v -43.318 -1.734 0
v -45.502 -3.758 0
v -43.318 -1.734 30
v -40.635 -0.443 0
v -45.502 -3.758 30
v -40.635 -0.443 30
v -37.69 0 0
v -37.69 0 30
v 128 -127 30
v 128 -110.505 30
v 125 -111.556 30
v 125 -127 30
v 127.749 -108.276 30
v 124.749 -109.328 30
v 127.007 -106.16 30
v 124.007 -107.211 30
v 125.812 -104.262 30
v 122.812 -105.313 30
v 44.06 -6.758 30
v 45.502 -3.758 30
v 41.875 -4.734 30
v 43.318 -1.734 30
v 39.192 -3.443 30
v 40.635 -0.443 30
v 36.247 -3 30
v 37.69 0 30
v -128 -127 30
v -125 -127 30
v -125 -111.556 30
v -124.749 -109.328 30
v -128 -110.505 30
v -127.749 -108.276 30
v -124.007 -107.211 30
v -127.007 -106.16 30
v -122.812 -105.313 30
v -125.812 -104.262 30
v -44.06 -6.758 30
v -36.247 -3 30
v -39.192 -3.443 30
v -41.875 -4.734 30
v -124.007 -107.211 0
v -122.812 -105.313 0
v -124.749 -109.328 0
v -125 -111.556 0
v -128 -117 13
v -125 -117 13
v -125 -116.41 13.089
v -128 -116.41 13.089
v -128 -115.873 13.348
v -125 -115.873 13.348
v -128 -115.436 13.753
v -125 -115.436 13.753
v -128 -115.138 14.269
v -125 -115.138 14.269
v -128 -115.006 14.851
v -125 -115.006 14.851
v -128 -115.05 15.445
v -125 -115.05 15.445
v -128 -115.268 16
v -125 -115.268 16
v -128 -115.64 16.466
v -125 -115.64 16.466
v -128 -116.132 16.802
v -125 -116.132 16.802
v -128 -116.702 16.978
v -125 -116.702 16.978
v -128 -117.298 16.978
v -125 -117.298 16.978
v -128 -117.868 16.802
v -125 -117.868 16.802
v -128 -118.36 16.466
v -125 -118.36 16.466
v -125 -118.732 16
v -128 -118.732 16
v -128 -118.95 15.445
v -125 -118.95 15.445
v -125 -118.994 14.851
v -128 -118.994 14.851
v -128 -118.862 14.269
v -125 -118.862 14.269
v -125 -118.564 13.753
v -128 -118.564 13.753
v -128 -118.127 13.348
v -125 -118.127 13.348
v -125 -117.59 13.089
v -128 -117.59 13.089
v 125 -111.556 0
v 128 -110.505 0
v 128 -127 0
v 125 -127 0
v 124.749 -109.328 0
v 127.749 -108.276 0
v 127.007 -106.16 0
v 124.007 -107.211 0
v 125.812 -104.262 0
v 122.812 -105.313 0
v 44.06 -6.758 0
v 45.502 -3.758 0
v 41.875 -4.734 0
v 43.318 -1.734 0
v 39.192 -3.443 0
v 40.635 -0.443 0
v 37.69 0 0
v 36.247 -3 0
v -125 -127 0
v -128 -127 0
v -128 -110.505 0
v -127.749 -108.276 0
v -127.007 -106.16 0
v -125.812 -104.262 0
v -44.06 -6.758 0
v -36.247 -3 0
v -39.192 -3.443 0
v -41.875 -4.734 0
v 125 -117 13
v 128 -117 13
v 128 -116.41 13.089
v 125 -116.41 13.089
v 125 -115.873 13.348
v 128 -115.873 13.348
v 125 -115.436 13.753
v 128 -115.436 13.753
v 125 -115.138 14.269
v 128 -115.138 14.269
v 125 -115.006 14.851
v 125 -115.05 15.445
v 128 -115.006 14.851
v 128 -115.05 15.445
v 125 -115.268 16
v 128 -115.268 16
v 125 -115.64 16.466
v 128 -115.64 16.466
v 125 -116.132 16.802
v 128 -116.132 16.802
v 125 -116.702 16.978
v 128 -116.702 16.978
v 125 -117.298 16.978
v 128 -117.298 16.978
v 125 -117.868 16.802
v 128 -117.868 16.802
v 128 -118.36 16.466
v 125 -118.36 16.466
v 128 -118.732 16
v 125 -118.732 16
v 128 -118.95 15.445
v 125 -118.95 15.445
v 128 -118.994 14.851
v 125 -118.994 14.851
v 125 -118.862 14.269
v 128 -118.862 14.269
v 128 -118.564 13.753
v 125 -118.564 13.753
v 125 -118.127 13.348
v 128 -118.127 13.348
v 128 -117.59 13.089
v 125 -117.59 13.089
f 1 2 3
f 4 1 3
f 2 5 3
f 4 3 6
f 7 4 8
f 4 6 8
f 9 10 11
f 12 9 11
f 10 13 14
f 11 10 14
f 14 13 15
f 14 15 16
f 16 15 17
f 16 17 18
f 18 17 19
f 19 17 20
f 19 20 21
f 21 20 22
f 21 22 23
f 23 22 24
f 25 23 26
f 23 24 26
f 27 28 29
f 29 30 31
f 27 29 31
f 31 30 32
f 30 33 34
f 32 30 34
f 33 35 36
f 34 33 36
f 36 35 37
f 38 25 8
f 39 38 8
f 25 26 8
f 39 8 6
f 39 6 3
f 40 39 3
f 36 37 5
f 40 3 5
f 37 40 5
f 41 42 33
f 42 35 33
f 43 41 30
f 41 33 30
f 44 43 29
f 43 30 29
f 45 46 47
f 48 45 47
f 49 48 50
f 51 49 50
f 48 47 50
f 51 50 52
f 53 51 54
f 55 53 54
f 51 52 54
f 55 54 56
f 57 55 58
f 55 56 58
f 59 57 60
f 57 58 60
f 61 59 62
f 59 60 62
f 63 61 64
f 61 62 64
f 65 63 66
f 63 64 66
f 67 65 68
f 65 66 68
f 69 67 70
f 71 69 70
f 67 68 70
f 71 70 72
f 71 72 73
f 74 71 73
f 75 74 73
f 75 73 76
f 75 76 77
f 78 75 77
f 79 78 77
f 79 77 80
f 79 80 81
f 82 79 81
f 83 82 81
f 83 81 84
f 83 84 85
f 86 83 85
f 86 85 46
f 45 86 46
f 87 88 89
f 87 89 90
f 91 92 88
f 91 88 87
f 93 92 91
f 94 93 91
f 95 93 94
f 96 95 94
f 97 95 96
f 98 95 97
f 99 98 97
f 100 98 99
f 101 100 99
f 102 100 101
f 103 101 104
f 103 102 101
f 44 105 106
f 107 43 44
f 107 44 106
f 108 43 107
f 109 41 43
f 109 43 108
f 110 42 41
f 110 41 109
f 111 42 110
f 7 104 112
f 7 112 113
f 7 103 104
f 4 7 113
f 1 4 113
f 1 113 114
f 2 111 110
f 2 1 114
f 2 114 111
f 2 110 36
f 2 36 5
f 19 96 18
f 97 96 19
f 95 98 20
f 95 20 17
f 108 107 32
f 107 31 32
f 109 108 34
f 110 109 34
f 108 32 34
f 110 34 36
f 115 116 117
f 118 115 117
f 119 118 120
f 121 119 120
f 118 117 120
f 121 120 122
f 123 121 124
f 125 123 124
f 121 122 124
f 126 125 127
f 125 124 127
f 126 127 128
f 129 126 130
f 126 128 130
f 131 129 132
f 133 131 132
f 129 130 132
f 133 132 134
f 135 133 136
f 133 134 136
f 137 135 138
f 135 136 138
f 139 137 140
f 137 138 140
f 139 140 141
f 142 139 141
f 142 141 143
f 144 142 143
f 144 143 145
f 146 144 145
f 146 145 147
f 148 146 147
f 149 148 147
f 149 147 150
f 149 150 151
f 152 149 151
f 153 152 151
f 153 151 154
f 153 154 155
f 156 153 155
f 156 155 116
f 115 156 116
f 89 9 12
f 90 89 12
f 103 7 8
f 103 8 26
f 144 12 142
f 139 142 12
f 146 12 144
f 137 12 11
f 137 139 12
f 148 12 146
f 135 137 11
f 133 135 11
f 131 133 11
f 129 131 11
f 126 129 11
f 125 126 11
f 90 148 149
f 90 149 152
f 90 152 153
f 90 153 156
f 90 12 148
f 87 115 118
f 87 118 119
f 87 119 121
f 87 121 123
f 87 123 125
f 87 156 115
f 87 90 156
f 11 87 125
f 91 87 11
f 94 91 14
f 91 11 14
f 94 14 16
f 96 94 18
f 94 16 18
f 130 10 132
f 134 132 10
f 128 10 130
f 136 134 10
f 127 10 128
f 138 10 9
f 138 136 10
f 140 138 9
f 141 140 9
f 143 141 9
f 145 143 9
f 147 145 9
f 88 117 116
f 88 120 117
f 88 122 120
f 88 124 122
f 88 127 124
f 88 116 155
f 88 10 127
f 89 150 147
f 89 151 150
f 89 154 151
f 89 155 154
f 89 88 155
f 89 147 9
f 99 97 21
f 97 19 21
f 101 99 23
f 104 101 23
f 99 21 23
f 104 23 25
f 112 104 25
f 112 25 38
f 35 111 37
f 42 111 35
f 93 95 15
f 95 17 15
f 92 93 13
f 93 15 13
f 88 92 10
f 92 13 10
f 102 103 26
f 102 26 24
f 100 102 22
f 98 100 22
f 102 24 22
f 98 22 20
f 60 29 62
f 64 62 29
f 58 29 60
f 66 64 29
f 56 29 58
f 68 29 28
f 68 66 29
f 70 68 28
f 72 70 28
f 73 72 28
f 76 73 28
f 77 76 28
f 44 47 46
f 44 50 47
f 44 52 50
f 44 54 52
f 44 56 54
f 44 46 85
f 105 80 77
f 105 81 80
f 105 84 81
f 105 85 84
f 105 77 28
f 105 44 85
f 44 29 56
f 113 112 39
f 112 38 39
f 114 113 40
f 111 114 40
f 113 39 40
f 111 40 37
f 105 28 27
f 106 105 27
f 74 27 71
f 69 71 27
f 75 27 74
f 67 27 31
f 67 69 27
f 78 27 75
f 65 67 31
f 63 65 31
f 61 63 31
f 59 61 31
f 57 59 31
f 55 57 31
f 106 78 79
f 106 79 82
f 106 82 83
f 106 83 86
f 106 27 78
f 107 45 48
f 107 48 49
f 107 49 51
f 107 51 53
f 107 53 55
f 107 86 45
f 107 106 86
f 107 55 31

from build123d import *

# Parameters (mm, degrees)
BOSS_EXTRUDE1_DEPTH     = 30
FILLET1_R               = 10
SKETCH2_R               = 2
CUT_EXTRUDE1_DEPTH      = 1
CUT_EXTRUDE1_DEPTH_BACK = 257


with BuildPart() as part:
    # Sketch1 → Boss-Extrude1 (new body)
    with BuildSketch(Plane.XY):
        Polygon((128, -127), (125, -127), (125, -108.051382857), (41.057072577, -3), (-41.057072577, -3), (-125, -108.051382857), (-125, -127), (-128, -127), (-128, -107), (-42.5, 0), (42.5, 0), (128, -107), align=None)
    extrude(amount=BOSS_EXTRUDE1_DEPTH)

    # Fillet1
    fillet1_edges = [part.edges().sort_by_distance(p)[0] for p in [
        (125, -108.051382857, 15),
        (41.057072577, -3, 15),
        (-41.057072577, -3, 15),
        (-125, -108.051382857, 15),
        (-128, -107, 15),
        (-42.5, 0, 15),
        (42.5, 0, 15),
        (128, -107, 15),
    ]]
    fillet(fillet1_edges, radius=FILLET1_R)

    # Sketch2 → Cut-Extrude1 (cut, two sides)
    with BuildSketch(Plane(origin=(128, 0, 0), x_dir=(0, 0, -1), z_dir=(1, 0, 0))) as cut_extrude1_sk:
        with Locations((-15, -117)):
            Circle(SKETCH2_R)
    extrude(amount=CUT_EXTRUDE1_DEPTH, mode=Mode.SUBTRACT)
    extrude(cut_extrude1_sk.sketch, amount=-CUT_EXTRUDE1_DEPTH_BACK, mode=Mode.SUBTRACT)


solid = part.part
